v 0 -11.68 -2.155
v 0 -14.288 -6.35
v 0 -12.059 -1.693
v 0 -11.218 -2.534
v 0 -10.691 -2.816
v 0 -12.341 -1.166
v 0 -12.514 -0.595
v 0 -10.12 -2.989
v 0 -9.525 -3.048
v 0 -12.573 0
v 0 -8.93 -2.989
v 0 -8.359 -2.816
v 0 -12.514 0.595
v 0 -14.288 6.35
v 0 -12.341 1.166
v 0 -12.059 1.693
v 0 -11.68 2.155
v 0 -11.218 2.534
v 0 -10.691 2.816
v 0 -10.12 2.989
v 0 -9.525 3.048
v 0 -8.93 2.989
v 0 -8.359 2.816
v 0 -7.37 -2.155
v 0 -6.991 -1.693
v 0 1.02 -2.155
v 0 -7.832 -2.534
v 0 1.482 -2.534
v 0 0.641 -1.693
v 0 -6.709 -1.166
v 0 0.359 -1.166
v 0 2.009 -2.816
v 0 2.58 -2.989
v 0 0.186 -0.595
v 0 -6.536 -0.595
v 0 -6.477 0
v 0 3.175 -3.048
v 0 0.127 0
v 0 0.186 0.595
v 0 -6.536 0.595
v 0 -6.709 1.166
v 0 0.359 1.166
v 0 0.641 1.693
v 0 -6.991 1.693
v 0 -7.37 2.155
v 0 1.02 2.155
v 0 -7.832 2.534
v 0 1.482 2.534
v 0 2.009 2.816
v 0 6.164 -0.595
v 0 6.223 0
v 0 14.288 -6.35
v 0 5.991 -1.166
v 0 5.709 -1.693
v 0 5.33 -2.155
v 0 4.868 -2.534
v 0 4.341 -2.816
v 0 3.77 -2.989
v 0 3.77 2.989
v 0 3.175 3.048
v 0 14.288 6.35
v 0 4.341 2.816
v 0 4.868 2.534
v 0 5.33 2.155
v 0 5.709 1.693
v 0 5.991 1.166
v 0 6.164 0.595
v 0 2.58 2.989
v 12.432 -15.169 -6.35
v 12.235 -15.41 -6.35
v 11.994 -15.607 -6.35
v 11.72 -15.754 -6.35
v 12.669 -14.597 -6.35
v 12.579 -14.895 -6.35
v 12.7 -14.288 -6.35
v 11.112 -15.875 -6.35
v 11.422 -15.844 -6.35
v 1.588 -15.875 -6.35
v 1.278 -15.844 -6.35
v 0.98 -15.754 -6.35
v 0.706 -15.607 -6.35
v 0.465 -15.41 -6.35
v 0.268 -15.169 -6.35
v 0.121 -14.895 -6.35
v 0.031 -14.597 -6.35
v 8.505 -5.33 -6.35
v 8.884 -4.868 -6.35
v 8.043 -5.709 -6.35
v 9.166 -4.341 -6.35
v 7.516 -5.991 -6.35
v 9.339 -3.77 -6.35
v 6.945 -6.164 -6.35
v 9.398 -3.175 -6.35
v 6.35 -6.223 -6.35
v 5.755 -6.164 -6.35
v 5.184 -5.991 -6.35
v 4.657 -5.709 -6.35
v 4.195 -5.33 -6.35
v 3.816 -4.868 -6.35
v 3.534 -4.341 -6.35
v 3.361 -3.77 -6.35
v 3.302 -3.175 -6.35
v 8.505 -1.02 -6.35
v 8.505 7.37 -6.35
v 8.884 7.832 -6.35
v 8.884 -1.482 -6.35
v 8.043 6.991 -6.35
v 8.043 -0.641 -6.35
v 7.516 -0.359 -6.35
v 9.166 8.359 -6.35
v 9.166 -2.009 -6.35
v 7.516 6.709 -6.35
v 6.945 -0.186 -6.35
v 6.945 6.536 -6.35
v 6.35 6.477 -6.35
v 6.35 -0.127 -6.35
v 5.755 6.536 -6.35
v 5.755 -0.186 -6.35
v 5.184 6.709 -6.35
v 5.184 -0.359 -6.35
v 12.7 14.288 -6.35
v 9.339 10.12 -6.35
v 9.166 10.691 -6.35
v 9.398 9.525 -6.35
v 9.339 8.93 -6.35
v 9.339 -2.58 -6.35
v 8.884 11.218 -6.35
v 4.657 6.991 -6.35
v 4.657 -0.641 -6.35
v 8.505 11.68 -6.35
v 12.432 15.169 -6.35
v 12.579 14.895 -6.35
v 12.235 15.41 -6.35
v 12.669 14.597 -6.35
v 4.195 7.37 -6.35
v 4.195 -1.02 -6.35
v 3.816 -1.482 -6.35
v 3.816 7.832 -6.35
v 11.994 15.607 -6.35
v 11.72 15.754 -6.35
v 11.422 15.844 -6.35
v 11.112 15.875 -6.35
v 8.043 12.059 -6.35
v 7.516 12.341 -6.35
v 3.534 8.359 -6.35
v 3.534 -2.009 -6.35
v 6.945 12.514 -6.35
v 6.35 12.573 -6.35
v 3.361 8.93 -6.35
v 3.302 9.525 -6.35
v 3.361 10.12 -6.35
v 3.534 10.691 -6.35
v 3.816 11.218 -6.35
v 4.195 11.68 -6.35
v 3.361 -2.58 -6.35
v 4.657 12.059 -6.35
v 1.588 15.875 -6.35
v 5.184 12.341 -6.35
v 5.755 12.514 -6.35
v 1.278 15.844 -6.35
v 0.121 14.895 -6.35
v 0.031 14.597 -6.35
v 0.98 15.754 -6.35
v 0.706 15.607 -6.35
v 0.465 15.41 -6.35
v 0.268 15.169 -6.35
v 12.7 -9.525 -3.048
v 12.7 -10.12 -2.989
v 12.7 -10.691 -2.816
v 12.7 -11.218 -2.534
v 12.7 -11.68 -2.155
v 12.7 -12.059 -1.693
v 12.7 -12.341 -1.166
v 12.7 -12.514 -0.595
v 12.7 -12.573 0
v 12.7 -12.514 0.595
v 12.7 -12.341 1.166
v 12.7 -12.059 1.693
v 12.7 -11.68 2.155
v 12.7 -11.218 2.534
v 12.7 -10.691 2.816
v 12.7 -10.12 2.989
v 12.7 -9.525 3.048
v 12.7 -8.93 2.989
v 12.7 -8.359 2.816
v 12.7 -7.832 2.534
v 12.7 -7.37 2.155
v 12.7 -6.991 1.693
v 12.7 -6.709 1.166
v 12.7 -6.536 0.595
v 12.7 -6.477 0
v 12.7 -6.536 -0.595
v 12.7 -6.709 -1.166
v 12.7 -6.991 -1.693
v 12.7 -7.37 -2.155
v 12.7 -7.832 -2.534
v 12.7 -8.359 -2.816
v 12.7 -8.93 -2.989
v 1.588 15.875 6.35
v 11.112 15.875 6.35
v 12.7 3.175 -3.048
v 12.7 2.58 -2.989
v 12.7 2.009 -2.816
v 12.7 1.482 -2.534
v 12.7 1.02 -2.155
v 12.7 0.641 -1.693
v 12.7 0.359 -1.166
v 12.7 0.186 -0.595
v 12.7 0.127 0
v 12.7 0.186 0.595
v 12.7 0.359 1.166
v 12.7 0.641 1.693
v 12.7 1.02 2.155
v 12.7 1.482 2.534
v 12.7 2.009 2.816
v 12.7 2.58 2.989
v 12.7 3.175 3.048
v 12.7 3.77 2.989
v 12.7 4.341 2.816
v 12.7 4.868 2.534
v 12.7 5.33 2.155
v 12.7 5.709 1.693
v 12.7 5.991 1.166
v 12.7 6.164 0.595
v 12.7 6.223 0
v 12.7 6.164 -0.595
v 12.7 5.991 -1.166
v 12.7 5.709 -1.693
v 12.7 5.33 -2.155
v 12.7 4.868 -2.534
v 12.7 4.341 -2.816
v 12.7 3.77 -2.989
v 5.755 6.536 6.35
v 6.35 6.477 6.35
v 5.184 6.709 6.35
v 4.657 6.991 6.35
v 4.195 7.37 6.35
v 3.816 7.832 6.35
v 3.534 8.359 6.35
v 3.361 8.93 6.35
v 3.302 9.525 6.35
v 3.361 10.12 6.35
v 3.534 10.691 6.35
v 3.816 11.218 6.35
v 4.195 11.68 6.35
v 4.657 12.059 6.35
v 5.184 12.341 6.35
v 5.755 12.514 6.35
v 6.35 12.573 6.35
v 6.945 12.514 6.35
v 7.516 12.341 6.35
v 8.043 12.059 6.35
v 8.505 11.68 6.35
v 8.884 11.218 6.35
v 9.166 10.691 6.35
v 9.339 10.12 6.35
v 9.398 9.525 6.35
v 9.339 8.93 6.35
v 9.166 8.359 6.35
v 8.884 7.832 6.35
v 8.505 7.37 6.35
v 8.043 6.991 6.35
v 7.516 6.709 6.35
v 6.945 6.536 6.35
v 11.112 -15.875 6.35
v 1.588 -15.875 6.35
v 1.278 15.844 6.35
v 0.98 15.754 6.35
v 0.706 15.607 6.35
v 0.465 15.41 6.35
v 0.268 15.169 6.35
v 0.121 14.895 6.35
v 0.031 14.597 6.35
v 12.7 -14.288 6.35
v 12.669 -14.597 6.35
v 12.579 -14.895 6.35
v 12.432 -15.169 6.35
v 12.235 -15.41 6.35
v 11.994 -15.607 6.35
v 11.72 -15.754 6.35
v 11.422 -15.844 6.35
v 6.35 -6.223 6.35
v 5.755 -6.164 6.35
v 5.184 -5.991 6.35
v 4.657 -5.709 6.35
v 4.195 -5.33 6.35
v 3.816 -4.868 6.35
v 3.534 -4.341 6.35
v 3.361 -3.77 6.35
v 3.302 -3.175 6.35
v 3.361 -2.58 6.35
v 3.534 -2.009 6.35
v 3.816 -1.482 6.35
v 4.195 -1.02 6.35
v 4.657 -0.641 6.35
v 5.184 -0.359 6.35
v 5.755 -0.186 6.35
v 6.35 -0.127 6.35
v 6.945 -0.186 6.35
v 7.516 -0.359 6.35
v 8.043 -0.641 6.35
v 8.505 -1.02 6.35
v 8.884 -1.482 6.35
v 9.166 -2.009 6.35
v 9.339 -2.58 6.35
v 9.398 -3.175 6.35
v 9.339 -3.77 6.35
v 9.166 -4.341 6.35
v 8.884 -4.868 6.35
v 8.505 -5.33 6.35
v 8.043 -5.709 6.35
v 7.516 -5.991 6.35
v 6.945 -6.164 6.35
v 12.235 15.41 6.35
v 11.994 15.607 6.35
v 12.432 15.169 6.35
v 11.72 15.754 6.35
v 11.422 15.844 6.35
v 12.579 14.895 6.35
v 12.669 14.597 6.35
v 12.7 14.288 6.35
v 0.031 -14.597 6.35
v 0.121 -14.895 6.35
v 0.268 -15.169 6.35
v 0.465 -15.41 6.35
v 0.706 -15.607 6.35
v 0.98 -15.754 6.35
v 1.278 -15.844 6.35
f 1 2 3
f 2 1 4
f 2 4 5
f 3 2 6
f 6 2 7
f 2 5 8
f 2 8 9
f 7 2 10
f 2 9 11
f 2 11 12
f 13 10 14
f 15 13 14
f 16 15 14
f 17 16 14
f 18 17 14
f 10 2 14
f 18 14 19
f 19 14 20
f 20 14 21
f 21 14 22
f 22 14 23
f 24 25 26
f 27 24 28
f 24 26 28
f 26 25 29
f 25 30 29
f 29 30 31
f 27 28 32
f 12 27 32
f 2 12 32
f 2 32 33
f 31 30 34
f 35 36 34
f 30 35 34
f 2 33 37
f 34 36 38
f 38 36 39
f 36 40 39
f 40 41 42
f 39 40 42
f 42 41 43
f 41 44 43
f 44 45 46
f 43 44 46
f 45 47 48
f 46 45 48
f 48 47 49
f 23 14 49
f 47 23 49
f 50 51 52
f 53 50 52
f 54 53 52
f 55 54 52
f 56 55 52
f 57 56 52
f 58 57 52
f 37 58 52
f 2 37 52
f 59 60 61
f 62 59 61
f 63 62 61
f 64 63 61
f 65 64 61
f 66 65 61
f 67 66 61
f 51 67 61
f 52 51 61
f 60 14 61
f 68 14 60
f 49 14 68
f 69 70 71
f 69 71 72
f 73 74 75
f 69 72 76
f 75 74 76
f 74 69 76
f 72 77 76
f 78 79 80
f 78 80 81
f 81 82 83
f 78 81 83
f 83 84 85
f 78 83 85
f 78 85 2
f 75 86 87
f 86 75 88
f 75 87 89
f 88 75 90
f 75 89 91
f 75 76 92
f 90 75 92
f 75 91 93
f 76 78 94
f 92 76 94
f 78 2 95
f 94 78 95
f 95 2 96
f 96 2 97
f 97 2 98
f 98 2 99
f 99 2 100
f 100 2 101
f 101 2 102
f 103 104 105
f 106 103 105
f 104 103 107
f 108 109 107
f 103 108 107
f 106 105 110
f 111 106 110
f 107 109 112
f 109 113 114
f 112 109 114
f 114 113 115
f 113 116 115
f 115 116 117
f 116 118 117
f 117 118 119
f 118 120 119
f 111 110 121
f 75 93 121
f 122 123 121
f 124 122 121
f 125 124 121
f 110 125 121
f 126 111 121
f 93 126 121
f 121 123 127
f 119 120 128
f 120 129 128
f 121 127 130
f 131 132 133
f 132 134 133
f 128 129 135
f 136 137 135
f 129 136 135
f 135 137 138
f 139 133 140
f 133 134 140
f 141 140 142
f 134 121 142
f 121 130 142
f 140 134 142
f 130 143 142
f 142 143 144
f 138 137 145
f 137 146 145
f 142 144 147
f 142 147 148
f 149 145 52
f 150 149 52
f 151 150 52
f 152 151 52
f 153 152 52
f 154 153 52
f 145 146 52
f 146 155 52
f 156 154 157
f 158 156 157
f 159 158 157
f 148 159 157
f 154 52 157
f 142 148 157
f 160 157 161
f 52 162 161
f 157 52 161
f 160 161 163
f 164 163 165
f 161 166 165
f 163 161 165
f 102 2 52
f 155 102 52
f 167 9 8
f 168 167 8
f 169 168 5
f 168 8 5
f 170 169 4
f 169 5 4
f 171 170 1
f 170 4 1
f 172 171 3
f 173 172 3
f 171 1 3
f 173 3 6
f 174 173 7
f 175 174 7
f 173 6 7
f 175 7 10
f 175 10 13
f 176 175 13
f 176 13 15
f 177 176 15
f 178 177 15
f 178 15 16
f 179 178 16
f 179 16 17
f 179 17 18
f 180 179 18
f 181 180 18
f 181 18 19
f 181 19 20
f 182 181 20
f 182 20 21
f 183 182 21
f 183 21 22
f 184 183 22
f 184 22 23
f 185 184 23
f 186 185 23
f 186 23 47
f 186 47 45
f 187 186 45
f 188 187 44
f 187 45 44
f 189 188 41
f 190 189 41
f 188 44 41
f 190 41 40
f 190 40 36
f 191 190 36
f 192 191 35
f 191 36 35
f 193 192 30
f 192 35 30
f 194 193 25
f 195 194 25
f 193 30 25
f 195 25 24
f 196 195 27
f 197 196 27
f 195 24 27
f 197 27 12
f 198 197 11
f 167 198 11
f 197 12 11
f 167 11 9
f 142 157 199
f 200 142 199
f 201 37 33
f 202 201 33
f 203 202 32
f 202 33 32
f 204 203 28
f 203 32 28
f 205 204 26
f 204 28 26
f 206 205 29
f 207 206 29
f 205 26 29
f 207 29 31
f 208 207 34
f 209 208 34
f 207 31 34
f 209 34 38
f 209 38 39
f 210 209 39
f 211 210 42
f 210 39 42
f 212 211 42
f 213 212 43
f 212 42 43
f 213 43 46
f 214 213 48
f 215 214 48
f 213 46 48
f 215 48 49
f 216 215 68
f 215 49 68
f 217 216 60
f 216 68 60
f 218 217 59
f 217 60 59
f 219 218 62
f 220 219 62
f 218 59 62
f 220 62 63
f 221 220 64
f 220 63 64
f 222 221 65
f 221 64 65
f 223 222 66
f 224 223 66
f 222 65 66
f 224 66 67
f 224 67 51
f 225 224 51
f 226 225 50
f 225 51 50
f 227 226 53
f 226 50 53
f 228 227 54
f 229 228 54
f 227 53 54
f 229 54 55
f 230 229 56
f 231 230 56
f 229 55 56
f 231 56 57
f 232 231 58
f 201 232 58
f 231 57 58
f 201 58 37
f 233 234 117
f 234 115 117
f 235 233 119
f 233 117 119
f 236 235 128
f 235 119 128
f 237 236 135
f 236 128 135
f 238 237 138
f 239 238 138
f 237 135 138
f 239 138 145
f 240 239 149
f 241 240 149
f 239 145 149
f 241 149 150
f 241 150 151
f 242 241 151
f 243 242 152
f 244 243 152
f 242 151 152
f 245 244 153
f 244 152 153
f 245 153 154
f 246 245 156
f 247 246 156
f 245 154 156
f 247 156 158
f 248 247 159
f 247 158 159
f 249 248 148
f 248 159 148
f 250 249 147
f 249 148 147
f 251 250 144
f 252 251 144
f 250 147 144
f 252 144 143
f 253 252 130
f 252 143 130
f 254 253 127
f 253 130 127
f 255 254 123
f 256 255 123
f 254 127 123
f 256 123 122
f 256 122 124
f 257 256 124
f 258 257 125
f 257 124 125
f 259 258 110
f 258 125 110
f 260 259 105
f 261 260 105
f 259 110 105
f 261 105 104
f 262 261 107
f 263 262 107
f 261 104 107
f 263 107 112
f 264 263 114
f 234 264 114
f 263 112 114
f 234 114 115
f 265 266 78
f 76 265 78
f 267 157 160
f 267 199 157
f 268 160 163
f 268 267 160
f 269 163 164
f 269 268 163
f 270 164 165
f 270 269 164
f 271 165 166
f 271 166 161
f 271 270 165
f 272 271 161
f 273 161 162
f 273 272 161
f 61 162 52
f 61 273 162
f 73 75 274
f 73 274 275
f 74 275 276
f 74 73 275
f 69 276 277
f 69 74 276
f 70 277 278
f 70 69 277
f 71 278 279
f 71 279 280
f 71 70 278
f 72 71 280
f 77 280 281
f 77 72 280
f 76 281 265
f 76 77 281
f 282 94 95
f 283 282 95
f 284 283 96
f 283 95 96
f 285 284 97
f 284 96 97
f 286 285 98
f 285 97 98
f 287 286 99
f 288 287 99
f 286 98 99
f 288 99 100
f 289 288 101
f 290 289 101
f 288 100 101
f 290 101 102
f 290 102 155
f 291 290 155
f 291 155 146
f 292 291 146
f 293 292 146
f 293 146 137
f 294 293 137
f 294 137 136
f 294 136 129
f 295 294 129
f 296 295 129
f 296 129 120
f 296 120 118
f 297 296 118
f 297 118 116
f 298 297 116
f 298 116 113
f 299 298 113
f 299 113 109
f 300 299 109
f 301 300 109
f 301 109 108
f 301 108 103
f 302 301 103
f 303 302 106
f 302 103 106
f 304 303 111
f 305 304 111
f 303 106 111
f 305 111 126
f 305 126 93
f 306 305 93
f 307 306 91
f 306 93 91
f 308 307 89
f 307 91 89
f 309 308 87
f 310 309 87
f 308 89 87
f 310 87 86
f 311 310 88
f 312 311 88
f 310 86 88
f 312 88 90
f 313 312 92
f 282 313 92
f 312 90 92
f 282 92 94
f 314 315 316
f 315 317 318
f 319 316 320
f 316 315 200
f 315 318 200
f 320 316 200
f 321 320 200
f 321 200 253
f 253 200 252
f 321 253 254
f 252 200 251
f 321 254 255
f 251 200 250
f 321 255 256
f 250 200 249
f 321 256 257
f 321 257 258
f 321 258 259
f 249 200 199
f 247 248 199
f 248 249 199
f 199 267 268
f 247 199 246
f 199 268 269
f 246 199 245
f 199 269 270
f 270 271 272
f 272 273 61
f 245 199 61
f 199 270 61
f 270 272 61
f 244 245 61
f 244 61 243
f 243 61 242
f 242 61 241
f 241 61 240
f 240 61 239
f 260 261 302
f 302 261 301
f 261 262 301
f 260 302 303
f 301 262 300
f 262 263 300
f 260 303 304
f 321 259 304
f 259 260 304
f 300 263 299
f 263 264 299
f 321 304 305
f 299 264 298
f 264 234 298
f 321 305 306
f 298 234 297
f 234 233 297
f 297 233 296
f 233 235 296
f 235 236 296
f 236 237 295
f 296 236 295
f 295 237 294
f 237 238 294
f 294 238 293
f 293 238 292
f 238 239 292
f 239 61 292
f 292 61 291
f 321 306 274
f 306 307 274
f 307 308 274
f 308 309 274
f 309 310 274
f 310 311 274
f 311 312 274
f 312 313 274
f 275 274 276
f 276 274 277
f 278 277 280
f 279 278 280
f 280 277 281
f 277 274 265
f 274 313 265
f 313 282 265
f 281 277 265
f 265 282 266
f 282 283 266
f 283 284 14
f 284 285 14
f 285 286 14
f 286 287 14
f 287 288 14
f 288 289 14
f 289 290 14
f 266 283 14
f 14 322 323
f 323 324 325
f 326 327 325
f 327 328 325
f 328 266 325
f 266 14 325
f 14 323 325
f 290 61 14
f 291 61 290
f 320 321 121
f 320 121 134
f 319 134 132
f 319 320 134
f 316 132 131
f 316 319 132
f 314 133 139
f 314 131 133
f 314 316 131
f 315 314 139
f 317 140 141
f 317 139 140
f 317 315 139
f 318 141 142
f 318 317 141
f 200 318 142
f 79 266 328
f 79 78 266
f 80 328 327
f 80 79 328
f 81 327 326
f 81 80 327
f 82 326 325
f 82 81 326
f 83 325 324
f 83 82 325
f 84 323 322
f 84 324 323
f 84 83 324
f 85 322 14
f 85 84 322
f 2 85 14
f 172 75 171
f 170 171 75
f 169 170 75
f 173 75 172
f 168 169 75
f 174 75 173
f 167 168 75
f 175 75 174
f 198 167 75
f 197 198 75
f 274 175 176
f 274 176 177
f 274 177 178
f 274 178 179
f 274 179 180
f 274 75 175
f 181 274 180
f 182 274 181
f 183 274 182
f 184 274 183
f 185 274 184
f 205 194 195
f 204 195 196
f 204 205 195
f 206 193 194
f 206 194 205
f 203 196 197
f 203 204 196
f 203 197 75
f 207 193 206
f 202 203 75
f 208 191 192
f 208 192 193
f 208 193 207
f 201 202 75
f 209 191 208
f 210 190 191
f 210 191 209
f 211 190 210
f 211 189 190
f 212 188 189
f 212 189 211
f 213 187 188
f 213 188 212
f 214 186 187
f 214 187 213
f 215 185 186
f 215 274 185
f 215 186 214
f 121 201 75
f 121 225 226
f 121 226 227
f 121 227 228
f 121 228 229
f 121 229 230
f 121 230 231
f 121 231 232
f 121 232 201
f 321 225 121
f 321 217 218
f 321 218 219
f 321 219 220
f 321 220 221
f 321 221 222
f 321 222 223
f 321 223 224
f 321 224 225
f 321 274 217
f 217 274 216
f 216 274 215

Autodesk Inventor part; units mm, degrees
ref_plane "YZ Plane" through (0, 0, 0) normal (1, 0, 0) x (0, 1, 0)
ref_plane "XZ Plane" through (0, 0, 0) normal (0, 1, 0) x (-1, 0, 0)
ref_plane "XY Plane" through (0, 0, 0) normal (0, 0, 1) x (1, 0, 0)
sketch "Sketch1" plane through (0, 0, 0) normal (1, 0, 0) x (0, 1, 0)
  line L0 (15.875, 6.35) -> (-15.875, 6.35)
  line L1 (-15.875, 6.35) -> (-15.875, -6.35)
  line L2 (-15.875, -6.35) -> (15.875, -6.35)
  line L3 (15.875, -6.35) -> (15.875, 6.35)
  line L4 (15.875, 6.35) -> (-15.875, -6.35) construction
  line L5 (-15.875, 6.35) -> (15.875, -6.35) construction
  point P0 (0, 0)
  dimension "d0" = 31.75
  dimension "d1" = 12.7
extrude "Extrusion1" add sketch "Sketch1" along normal blind 12.7
sketch "Sketch2" plane through (12.7, 0, 0) normal (1, 0, 0) x (0, 0, -1)
  line L0 (6.35, 15.875) -> (-6.35, 15.875) projected
  point P0 (0, 0)
  point P1 (0, -9.525)
  point P2 (0, 3.175)
  dimension "d4" = 12.7
  dimension "d5" = 12.7
hole "Hole1" at (12.7, -9.525, 0) at (12.7, 3.175, 0) direction (-1, 0, 0) diameter 6.096 depth 25.4 tip angle 118
sketch "Sketch3" plane through (0, -15.875, 6.35) normal (0, 0, 1) x (1, 0, 0)
  line L0 (0, 31.75) -> (12.7, 31.75) projected
  point P0 (0, 15.875)
  point P1 (6.35, 25.4)
  point P2 (6.35, 12.7)
  point P3 (6.35, 31.75)
  dimension "d13" = 12.7
  dimension "d14" = 6.35
hole "Hole2" at (6.35, 9.525, 6.35) at (6.35, -3.175, 6.35) direction (0, 0, -1) diameter 6.096 depth 25.4 tip angle 118
fillet "Fillet1" radius 1.5875 4 edges at (12.7, -15.875, 0) (0, -15.875, 0) (12.7, 15.875, 0) (0, 15.875, 0)
properties part number "3DPRINT,NUT-BLOCK" material "Nylon 6/6"
